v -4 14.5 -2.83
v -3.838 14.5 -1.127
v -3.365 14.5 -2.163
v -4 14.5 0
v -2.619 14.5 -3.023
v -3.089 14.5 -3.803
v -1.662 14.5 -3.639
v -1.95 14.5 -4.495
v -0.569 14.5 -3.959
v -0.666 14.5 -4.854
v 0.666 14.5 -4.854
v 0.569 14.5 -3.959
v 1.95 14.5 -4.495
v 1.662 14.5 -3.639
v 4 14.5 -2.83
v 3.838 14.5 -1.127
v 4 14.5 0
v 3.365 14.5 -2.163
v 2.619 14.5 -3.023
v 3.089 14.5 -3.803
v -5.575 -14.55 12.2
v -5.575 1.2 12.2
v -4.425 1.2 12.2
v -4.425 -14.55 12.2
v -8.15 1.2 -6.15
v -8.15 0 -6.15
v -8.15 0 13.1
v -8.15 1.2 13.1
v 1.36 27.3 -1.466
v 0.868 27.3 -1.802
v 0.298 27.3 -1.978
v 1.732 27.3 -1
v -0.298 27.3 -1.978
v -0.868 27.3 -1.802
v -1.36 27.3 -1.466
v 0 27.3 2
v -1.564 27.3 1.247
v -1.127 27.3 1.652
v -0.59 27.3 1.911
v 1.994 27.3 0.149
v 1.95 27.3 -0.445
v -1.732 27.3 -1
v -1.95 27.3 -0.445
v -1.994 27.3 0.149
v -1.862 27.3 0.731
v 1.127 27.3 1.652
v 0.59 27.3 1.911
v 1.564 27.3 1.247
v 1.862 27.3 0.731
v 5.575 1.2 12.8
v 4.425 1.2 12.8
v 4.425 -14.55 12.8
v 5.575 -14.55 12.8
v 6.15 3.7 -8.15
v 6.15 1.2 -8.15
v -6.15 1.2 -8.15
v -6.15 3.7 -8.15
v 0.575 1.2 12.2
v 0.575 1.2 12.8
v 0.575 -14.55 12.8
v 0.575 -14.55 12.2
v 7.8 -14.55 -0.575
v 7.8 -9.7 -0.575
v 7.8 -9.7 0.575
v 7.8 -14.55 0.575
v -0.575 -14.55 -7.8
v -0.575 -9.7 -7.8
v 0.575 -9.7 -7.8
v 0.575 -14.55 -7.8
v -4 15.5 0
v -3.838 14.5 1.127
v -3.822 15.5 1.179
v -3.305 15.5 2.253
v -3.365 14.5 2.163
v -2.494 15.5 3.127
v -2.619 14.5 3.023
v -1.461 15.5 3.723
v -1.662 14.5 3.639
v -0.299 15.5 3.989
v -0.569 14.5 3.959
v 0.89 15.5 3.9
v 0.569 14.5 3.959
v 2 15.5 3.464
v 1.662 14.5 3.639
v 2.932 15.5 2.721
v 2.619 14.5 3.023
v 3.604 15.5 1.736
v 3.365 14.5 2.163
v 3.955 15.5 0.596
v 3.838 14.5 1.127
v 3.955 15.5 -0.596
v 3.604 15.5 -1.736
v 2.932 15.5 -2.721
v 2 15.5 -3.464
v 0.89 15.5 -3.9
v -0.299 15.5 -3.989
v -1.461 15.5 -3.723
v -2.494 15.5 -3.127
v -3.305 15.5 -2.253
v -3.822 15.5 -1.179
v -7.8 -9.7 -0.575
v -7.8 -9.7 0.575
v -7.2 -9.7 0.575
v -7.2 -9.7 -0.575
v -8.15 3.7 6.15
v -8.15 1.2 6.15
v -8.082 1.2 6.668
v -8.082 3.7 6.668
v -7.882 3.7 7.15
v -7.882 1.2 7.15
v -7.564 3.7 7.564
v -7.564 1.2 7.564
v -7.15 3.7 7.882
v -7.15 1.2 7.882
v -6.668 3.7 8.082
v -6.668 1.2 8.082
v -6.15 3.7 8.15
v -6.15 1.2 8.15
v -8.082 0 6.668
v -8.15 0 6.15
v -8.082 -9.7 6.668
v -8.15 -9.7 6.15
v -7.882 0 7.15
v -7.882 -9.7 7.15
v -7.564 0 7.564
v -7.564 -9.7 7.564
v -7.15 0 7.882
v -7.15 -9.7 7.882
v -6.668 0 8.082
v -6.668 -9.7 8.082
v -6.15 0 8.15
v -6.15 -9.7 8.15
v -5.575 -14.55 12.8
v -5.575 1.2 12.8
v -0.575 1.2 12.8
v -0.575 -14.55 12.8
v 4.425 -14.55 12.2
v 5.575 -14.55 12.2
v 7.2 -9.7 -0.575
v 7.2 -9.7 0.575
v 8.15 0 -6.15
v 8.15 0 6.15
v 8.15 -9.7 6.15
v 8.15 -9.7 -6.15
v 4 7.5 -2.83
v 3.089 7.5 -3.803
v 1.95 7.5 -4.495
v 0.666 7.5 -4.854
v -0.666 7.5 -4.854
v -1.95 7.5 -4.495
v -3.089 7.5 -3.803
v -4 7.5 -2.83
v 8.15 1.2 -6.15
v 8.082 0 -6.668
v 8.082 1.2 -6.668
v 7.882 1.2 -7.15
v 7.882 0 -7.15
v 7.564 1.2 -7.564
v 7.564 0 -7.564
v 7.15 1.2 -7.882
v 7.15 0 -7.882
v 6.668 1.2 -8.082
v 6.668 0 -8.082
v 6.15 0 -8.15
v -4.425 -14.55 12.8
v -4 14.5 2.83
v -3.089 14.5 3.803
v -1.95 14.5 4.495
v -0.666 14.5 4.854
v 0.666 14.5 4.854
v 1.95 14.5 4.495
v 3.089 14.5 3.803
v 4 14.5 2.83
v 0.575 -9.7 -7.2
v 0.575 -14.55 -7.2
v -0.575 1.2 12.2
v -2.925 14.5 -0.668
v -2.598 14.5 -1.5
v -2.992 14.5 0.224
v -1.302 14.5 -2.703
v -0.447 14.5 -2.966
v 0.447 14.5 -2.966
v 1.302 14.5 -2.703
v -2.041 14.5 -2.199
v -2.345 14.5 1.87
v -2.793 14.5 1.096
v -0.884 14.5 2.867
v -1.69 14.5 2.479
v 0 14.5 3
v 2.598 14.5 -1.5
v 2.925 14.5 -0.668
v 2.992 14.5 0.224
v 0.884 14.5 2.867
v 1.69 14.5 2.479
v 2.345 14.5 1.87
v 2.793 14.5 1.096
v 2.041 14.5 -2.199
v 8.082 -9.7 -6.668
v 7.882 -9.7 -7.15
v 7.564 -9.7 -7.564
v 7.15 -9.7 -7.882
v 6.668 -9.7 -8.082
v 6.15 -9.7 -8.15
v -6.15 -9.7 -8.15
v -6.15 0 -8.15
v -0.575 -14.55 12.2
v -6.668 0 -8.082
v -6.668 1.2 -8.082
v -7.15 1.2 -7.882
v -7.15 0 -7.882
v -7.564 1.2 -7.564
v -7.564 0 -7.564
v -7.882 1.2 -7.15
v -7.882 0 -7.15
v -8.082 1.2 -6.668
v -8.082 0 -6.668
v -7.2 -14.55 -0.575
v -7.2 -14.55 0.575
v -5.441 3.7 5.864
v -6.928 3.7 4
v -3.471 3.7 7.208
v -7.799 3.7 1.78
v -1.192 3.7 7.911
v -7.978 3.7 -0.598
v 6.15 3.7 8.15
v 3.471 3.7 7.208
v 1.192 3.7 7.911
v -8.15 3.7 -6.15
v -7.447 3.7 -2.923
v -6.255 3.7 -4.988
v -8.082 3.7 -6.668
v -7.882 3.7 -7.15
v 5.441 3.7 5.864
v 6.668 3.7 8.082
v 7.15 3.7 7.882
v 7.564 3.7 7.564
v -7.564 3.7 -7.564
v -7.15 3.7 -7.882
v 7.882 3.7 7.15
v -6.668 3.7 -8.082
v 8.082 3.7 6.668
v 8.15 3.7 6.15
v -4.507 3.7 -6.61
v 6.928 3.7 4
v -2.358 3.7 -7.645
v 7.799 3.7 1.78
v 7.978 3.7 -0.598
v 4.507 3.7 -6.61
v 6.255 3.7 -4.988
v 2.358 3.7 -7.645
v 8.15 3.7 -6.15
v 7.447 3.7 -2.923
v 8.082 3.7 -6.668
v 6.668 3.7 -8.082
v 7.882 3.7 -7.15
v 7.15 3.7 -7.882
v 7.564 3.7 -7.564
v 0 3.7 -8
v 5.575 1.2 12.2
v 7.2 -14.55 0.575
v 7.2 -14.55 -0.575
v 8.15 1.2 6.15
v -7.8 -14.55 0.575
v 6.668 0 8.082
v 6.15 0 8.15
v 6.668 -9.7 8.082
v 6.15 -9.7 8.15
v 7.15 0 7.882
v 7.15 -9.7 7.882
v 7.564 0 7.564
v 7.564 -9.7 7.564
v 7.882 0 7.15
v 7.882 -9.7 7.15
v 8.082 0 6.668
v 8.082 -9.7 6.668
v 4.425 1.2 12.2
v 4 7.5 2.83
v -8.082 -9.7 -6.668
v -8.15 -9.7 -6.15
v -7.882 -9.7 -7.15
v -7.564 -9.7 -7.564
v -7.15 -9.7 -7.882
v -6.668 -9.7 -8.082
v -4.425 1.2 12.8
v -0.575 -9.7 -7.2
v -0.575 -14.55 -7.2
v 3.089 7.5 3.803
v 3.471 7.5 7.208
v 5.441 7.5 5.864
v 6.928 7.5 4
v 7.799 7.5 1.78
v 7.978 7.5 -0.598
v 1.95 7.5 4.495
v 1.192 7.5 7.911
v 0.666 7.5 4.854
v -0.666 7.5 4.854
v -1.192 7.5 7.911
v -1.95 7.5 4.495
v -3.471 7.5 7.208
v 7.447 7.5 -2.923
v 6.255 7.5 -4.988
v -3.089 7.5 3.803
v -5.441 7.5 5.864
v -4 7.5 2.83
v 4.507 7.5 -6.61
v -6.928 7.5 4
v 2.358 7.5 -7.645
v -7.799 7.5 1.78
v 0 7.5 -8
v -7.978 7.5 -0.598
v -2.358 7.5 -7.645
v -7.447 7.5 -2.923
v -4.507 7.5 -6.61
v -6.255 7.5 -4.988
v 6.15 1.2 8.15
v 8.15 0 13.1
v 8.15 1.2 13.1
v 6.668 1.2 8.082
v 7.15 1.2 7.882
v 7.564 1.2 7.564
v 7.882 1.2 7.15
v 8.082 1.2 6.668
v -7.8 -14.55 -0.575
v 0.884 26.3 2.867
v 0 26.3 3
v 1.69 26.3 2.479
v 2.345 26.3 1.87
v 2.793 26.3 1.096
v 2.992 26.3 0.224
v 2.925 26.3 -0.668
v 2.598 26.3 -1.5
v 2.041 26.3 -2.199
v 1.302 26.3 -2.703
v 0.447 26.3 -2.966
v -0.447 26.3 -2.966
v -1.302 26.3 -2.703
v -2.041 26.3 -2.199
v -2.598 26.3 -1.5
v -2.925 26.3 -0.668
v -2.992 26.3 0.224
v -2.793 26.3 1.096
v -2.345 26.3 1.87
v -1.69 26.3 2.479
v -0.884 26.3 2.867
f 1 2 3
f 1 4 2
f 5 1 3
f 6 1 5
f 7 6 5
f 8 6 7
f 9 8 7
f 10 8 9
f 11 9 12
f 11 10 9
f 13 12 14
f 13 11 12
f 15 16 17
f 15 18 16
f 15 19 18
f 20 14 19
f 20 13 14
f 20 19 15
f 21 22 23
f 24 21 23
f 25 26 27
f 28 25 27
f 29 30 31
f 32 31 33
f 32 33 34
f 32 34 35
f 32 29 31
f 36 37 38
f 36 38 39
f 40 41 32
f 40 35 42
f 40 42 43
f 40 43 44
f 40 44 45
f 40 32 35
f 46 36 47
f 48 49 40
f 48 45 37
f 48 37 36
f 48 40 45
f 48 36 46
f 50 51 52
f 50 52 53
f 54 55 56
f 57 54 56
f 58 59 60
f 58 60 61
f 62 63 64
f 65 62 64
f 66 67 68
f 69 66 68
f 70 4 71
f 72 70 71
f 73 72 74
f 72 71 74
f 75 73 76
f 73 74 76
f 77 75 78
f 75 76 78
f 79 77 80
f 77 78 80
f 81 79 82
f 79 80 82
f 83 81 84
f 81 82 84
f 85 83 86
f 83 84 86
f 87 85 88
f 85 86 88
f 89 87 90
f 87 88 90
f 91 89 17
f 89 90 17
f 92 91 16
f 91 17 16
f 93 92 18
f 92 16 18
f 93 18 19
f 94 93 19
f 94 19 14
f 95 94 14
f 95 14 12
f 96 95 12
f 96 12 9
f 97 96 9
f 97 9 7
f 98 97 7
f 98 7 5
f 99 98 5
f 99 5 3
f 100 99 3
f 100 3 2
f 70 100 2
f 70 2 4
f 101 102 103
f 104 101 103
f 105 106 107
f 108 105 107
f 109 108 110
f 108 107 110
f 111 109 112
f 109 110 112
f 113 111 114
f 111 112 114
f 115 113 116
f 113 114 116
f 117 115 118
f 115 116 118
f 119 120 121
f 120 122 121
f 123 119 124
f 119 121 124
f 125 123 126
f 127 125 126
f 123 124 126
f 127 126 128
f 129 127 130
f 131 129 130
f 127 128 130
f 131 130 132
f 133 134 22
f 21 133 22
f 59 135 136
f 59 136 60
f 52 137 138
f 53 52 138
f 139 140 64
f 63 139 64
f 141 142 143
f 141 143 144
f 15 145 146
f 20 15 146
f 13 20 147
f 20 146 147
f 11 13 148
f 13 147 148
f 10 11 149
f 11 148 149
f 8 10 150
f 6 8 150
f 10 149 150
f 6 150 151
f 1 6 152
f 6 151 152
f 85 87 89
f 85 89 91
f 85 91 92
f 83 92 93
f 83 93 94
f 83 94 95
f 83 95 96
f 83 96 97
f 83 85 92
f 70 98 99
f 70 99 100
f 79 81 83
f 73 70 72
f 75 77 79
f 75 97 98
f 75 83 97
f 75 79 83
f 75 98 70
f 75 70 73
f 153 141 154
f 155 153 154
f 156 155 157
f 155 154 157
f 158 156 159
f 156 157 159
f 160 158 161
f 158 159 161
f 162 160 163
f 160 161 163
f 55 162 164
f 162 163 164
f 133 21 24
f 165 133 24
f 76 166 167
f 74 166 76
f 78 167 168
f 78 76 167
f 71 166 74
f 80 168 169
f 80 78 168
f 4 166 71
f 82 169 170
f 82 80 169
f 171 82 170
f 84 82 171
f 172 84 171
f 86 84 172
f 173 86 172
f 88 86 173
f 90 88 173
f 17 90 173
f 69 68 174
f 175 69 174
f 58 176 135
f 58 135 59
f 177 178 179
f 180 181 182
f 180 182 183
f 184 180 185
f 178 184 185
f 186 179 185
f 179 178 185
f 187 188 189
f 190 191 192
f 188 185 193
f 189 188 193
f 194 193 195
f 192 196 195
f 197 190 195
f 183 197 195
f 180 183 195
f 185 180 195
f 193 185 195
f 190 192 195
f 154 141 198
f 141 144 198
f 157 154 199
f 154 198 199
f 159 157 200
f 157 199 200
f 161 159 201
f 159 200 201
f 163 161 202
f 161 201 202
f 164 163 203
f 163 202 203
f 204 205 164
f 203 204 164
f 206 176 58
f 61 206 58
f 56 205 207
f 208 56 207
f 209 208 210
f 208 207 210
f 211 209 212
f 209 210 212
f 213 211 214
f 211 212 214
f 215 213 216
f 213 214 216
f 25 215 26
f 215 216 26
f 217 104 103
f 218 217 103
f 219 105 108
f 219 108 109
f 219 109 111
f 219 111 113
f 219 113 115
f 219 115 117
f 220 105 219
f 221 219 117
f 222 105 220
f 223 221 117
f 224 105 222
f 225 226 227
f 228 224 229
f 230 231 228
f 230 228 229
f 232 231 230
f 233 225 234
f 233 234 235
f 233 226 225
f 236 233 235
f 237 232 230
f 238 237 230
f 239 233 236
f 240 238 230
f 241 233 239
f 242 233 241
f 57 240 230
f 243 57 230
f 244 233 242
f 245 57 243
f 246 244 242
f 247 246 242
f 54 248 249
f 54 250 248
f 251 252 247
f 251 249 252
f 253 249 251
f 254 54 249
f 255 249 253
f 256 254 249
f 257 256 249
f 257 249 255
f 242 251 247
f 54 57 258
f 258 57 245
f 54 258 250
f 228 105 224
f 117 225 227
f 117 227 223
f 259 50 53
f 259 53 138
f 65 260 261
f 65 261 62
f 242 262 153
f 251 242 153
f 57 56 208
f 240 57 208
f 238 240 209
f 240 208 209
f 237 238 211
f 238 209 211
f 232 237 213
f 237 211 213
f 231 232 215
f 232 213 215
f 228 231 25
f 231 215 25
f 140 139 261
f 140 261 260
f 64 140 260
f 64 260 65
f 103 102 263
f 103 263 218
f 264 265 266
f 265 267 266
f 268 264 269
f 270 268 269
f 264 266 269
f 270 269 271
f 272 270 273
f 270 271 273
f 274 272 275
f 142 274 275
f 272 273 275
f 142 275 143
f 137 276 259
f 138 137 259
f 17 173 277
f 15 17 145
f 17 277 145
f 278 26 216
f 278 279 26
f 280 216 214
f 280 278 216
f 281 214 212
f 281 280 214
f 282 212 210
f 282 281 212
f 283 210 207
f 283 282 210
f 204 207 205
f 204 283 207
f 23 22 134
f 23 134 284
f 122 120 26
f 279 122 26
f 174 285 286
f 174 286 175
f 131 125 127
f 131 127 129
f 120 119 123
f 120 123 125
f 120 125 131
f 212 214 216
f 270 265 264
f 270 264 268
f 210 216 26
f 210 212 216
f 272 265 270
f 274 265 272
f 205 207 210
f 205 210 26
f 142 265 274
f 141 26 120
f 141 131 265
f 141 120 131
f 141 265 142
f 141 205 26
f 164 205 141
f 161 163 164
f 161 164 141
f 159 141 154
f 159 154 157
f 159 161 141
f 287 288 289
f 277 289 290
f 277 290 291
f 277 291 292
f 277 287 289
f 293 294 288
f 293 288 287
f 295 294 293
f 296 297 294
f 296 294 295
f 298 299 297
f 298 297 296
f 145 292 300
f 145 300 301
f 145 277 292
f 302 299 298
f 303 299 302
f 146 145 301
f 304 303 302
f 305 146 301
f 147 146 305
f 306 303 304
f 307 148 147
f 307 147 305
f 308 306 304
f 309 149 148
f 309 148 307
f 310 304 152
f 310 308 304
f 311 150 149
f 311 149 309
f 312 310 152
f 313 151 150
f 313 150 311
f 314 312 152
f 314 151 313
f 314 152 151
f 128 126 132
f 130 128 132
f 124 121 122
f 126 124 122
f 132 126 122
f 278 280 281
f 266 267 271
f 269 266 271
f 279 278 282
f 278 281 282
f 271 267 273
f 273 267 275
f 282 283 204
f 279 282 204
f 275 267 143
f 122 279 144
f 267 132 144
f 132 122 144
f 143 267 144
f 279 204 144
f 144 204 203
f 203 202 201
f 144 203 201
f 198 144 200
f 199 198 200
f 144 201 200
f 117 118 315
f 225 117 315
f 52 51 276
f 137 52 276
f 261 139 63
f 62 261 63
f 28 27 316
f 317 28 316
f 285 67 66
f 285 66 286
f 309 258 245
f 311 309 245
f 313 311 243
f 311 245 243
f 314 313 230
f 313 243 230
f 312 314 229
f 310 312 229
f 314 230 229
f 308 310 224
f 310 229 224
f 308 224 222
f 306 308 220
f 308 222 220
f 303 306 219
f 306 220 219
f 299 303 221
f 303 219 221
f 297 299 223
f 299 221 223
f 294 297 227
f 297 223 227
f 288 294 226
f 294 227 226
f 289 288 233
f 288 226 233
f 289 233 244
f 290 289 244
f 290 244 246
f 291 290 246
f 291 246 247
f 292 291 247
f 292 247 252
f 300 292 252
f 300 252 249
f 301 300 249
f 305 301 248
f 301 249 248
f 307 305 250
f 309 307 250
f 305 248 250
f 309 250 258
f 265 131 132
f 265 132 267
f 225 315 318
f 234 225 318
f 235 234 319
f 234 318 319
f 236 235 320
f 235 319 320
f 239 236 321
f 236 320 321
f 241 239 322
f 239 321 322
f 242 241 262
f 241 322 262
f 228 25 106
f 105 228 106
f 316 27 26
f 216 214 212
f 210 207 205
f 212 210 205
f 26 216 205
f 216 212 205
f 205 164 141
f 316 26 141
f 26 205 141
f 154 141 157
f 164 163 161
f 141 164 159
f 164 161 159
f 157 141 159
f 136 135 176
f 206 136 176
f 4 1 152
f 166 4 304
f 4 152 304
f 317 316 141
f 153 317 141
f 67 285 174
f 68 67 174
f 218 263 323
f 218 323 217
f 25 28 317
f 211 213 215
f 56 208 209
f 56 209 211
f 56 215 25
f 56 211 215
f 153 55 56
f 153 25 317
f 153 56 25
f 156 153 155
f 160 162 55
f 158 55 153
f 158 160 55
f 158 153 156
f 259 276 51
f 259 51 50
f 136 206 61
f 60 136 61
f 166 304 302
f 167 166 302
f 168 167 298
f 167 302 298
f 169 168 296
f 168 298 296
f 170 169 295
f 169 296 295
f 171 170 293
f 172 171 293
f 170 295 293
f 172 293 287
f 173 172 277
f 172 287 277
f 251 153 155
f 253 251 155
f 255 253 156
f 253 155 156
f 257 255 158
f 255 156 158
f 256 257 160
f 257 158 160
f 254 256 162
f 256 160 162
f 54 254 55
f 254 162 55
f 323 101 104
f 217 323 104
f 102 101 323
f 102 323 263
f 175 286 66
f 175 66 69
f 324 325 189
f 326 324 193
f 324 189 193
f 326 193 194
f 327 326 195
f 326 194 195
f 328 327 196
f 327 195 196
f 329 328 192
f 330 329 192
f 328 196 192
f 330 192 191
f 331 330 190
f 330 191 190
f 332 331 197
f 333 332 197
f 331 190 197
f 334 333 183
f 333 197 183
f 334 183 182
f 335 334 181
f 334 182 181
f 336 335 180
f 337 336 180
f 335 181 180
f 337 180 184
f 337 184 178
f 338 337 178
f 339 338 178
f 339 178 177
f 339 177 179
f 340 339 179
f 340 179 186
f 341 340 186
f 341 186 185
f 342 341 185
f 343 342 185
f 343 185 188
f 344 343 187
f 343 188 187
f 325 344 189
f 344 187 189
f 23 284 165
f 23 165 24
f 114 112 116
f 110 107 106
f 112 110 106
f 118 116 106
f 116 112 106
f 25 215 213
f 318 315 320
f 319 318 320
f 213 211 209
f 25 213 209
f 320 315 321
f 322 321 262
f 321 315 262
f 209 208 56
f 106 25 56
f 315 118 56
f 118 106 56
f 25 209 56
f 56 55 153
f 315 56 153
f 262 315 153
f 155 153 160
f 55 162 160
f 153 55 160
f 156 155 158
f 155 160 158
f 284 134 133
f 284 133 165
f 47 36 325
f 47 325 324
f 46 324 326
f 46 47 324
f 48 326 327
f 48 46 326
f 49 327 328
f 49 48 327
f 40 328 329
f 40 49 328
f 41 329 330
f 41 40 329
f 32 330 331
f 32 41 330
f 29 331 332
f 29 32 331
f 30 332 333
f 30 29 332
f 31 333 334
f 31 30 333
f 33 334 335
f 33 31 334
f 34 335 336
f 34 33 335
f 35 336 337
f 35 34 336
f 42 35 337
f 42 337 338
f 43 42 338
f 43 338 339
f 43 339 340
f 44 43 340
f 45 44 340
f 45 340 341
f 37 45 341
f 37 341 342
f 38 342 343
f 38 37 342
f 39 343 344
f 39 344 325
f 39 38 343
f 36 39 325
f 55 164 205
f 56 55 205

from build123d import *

# Parameters (mm, degrees)
CROQUIS1_W                   = 16.3
CROQUIS1_H                   = 16.3
SALIENTE_EXTRUIR1_DEPTH      = 9.7
REDONDEO1_R                  = 2
SALIENTE_EXTRUIR2_DEPTH      = 1.2
SALIENTE_EXTRUIR3_DEPTH      = 2.5
CROQUIS4_R                   = 8
SALIENTE_EXTRUIR4_DEPTH      = 3.8
SALIENTE_EXTRUIR5_DEPTH      = 7
CROQUIS7_R                   = 4
SALIENTE_EXTRUIR6_DEPTH      = 1
SALIENTE_EXTRUIR7_DEPTH      = 11.8
SALIENTE_EXTRUIR7_DEPTH_BACK = 1
CROQUIS8_R                   = 3
CHAFL_N1_SIZE                = 1
CROQUIS9_W                   = 1.15
CROQUIS9_H                   = 0.6
SALIENTE_EXTRUIR8_DEPTH      = 4.85
CROQUIS9_W_2                 = 0.6
CROQUIS9_H_2                 = 1.15
SALIENTE_EXTRUIR8_2_DEPTH    = 4.85
SALIENTE_EXTRUIR8_3_DEPTH    = 4.85
CROQUIS10_W                  = 1.15
CROQUIS10_H                  = 0.6
SALIENTE_EXTRUIR9_DEPTH      = 15.75
SALIENTE_EXTRUIR9_2_DEPTH    = 15.75
SALIENTE_EXTRUIR9_3_DEPTH    = 15.75


with BuildPart() as part:
    # Croquis1 → Saliente-Extruir1 (new body)
    with BuildSketch(Plane(origin=(0, 0, 0), x_dir=(1, 0, 0), z_dir=(0, 1, 0))):
        Rectangle(CROQUIS1_W, CROQUIS1_H)
    extrude(amount=-SALIENTE_EXTRUIR1_DEPTH)

    # Redondeo1
    redondeo1_edges = [part.edges().sort_by_distance(p)[0] for p in [
        (8.15, -4.85, 8.15),
        (-8.15, -4.85, 8.15),
        (-8.15, -4.85, -8.15),
        (8.15, -4.85, -8.15),
    ]]
    fillet(redondeo1_edges, radius=REDONDEO1_R)


with BuildPart() as body_2:
    # Croquis2 → Saliente-Extruir2 (new body)
    with BuildSketch(Plane(origin=(0, 0, 0), x_dir=(1, 0, 0), z_dir=(0, 1, 0))):
        with BuildLine():
            Line((-8.15, -13.1), (8.15, -13.1))
            Line((8.15, -13.1), (8.15, 6.15))
            ThreePointArc((8.15, 6.15), (7.564213562, 7.564213562), (6.15, 8.15))
            Line((6.15, 8.15), (-6.15, 8.15))
            ThreePointArc((-6.15, 8.15), (-7.564213562, 7.564213562), (-8.15, 6.15))
            Line((-8.15, 6.15), (-8.15, -13.1))
        make_face()
    extrude(amount=SALIENTE_EXTRUIR2_DEPTH)


with BuildPart() as body_3:
    # Croquis3 → Saliente-Extruir3 (new body)
    with BuildSketch(Plane(origin=(0, 1.2, 0), x_dir=(1, 0, 0), z_dir=(0, 1, 0))):
        with BuildLine():
            Line((8.15, -6.15), (8.15, 6.15))
            ThreePointArc((8.15, 6.15), (7.564213562, 7.564213562), (6.15, 8.15))
            Line((6.15, 8.15), (-6.15, 8.15))
            ThreePointArc((-6.15, 8.15), (-7.564213562, 7.564213562), (-8.15, 6.15))
            Line((-8.15, 6.15), (-8.15, -6.15))
            ThreePointArc((-8.15, -6.15), (-7.564213562, -7.564213562), (-6.15, -8.15))
            Line((-6.15, -8.15), (6.15, -8.15))
            ThreePointArc((6.15, -8.15), (7.564213562, -7.564213562), (8.15, -6.15))
        make_face()
    extrude(amount=SALIENTE_EXTRUIR3_DEPTH)

    # Croquis4 → Saliente-Extruir4 (add)
    with BuildSketch(Plane(origin=(0, 3.7, 0), x_dir=(1, 0, 0), z_dir=(0, 1, 0))):
        with Locations(Location((0, 0, 0), (0, 0, 90))):
            Circle(CROQUIS4_R)
    extrude(amount=SALIENTE_EXTRUIR4_DEPTH)

    # Croquis6 → Saliente-Extruir5 (add)
    with BuildSketch(Plane(origin=(0, 7.5, 0), x_dir=(1, 0, 0), z_dir=(0, 1, 0))):
        with BuildLine():
            Line((-4, 2.83019434), (-4, -2.83019434))
            ThreePointArc((-4, -2.83019434), (0, -4.9), (4, -2.83019434))
            Line((4, -2.83019434), (4, 2.83019434))
            ThreePointArc((4, 2.83019434), (0, 4.9), (-4, 2.83019434))
        make_face()
    extrude(amount=SALIENTE_EXTRUIR5_DEPTH)

    # Croquis7 → Saliente-Extruir6 (add)
    with BuildSketch(Plane(origin=(0, 14.5, 0), x_dir=(1, 0, 0), z_dir=(0, 1, 0))):
        with Locations(Location((0, 0, 0), (0, 0, 180))):
            Circle(CROQUIS7_R)
    extrude(amount=SALIENTE_EXTRUIR6_DEPTH)


with BuildPart() as body_4:
    # Croquis8 → Saliente-Extruir7 (new, two sides: drawn at the far end of the back side and taken through both)
    with BuildSketch(Plane(origin=(0, 15.5, 0), x_dir=(1, 0, 0), z_dir=(0, 1, 0)).offset(-SALIENTE_EXTRUIR7_DEPTH_BACK)):
        with Locations(Location((0, 0, 0), (0, 0, 270))):
            Circle(CROQUIS8_R)
    extrude(amount=SALIENTE_EXTRUIR7_DEPTH + SALIENTE_EXTRUIR7_DEPTH_BACK)

    # Chaflán1
    chafl_n1_edges = [body_4.edges().sort_by_distance(p)[0] for p in [
        (0, 27.3, -3),
    ]]
    chamfer(chafl_n1_edges, length=CHAFL_N1_SIZE)


with BuildPart() as body_5:
    # Croquis9 → Saliente-Extruir8 (new body)
    with BuildSketch(Plane.XZ.offset(9.7)):
        with Locations((0, -7.5)):
            Rectangle(CROQUIS9_W, CROQUIS9_H)
    extrude(amount=SALIENTE_EXTRUIR8_DEPTH)


with BuildPart() as body_6:
    # Croquis9 → Saliente-Extruir8 2 (new body)
    with BuildSketch(Plane.XZ.offset(9.7)):
        with Locations((7.5, 0)):
            Rectangle(CROQUIS9_W_2, CROQUIS9_H_2)
    extrude(amount=SALIENTE_EXTRUIR8_2_DEPTH)


with BuildPart() as body_7:
    # Croquis9 → Saliente-Extruir8 3 (new body)
    with BuildSketch(Plane.XZ.offset(9.7)):
        with Locations((-7.5, 0)):
            Rectangle(CROQUIS9_W_2, CROQUIS9_H_2)
    extrude(amount=SALIENTE_EXTRUIR8_3_DEPTH)


with BuildPart() as body_8:
    # Croquis10 → Saliente-Extruir9 (new body)
    with BuildSketch(Plane(origin=(0, 1.2, 0), x_dir=(1, 0, 0), z_dir=(0, 1, 0))):
        with Locations((-5, -12.5)):
            Rectangle(CROQUIS10_W, CROQUIS10_H)
    extrude(amount=-SALIENTE_EXTRUIR9_DEPTH)


with BuildPart() as body_9:
    # Croquis10 → Saliente-Extruir9 2 (new body)
    with BuildSketch(Plane(origin=(0, 1.2, 0), x_dir=(1, 0, 0), z_dir=(0, 1, 0))):
        with Locations((5, -12.5)):
            Rectangle(CROQUIS10_W, CROQUIS10_H)
    extrude(amount=-SALIENTE_EXTRUIR9_2_DEPTH)


with BuildPart() as body_10:
    # Croquis10 → Saliente-Extruir9 3 (new body)
    with BuildSketch(Plane(origin=(0, 1.2, 0), x_dir=(1, 0, 0), z_dir=(0, 1, 0))):
        with Locations((0, -12.5)):
            Rectangle(CROQUIS10_W, CROQUIS10_H)
    extrude(amount=-SALIENTE_EXTRUIR9_3_DEPTH)


solid = Compound([part.part, body_2.part, body_3.part, body_4.part, body_5.part, body_6.part, body_7.part, body_8.part, body_9.part, body_10.part])
